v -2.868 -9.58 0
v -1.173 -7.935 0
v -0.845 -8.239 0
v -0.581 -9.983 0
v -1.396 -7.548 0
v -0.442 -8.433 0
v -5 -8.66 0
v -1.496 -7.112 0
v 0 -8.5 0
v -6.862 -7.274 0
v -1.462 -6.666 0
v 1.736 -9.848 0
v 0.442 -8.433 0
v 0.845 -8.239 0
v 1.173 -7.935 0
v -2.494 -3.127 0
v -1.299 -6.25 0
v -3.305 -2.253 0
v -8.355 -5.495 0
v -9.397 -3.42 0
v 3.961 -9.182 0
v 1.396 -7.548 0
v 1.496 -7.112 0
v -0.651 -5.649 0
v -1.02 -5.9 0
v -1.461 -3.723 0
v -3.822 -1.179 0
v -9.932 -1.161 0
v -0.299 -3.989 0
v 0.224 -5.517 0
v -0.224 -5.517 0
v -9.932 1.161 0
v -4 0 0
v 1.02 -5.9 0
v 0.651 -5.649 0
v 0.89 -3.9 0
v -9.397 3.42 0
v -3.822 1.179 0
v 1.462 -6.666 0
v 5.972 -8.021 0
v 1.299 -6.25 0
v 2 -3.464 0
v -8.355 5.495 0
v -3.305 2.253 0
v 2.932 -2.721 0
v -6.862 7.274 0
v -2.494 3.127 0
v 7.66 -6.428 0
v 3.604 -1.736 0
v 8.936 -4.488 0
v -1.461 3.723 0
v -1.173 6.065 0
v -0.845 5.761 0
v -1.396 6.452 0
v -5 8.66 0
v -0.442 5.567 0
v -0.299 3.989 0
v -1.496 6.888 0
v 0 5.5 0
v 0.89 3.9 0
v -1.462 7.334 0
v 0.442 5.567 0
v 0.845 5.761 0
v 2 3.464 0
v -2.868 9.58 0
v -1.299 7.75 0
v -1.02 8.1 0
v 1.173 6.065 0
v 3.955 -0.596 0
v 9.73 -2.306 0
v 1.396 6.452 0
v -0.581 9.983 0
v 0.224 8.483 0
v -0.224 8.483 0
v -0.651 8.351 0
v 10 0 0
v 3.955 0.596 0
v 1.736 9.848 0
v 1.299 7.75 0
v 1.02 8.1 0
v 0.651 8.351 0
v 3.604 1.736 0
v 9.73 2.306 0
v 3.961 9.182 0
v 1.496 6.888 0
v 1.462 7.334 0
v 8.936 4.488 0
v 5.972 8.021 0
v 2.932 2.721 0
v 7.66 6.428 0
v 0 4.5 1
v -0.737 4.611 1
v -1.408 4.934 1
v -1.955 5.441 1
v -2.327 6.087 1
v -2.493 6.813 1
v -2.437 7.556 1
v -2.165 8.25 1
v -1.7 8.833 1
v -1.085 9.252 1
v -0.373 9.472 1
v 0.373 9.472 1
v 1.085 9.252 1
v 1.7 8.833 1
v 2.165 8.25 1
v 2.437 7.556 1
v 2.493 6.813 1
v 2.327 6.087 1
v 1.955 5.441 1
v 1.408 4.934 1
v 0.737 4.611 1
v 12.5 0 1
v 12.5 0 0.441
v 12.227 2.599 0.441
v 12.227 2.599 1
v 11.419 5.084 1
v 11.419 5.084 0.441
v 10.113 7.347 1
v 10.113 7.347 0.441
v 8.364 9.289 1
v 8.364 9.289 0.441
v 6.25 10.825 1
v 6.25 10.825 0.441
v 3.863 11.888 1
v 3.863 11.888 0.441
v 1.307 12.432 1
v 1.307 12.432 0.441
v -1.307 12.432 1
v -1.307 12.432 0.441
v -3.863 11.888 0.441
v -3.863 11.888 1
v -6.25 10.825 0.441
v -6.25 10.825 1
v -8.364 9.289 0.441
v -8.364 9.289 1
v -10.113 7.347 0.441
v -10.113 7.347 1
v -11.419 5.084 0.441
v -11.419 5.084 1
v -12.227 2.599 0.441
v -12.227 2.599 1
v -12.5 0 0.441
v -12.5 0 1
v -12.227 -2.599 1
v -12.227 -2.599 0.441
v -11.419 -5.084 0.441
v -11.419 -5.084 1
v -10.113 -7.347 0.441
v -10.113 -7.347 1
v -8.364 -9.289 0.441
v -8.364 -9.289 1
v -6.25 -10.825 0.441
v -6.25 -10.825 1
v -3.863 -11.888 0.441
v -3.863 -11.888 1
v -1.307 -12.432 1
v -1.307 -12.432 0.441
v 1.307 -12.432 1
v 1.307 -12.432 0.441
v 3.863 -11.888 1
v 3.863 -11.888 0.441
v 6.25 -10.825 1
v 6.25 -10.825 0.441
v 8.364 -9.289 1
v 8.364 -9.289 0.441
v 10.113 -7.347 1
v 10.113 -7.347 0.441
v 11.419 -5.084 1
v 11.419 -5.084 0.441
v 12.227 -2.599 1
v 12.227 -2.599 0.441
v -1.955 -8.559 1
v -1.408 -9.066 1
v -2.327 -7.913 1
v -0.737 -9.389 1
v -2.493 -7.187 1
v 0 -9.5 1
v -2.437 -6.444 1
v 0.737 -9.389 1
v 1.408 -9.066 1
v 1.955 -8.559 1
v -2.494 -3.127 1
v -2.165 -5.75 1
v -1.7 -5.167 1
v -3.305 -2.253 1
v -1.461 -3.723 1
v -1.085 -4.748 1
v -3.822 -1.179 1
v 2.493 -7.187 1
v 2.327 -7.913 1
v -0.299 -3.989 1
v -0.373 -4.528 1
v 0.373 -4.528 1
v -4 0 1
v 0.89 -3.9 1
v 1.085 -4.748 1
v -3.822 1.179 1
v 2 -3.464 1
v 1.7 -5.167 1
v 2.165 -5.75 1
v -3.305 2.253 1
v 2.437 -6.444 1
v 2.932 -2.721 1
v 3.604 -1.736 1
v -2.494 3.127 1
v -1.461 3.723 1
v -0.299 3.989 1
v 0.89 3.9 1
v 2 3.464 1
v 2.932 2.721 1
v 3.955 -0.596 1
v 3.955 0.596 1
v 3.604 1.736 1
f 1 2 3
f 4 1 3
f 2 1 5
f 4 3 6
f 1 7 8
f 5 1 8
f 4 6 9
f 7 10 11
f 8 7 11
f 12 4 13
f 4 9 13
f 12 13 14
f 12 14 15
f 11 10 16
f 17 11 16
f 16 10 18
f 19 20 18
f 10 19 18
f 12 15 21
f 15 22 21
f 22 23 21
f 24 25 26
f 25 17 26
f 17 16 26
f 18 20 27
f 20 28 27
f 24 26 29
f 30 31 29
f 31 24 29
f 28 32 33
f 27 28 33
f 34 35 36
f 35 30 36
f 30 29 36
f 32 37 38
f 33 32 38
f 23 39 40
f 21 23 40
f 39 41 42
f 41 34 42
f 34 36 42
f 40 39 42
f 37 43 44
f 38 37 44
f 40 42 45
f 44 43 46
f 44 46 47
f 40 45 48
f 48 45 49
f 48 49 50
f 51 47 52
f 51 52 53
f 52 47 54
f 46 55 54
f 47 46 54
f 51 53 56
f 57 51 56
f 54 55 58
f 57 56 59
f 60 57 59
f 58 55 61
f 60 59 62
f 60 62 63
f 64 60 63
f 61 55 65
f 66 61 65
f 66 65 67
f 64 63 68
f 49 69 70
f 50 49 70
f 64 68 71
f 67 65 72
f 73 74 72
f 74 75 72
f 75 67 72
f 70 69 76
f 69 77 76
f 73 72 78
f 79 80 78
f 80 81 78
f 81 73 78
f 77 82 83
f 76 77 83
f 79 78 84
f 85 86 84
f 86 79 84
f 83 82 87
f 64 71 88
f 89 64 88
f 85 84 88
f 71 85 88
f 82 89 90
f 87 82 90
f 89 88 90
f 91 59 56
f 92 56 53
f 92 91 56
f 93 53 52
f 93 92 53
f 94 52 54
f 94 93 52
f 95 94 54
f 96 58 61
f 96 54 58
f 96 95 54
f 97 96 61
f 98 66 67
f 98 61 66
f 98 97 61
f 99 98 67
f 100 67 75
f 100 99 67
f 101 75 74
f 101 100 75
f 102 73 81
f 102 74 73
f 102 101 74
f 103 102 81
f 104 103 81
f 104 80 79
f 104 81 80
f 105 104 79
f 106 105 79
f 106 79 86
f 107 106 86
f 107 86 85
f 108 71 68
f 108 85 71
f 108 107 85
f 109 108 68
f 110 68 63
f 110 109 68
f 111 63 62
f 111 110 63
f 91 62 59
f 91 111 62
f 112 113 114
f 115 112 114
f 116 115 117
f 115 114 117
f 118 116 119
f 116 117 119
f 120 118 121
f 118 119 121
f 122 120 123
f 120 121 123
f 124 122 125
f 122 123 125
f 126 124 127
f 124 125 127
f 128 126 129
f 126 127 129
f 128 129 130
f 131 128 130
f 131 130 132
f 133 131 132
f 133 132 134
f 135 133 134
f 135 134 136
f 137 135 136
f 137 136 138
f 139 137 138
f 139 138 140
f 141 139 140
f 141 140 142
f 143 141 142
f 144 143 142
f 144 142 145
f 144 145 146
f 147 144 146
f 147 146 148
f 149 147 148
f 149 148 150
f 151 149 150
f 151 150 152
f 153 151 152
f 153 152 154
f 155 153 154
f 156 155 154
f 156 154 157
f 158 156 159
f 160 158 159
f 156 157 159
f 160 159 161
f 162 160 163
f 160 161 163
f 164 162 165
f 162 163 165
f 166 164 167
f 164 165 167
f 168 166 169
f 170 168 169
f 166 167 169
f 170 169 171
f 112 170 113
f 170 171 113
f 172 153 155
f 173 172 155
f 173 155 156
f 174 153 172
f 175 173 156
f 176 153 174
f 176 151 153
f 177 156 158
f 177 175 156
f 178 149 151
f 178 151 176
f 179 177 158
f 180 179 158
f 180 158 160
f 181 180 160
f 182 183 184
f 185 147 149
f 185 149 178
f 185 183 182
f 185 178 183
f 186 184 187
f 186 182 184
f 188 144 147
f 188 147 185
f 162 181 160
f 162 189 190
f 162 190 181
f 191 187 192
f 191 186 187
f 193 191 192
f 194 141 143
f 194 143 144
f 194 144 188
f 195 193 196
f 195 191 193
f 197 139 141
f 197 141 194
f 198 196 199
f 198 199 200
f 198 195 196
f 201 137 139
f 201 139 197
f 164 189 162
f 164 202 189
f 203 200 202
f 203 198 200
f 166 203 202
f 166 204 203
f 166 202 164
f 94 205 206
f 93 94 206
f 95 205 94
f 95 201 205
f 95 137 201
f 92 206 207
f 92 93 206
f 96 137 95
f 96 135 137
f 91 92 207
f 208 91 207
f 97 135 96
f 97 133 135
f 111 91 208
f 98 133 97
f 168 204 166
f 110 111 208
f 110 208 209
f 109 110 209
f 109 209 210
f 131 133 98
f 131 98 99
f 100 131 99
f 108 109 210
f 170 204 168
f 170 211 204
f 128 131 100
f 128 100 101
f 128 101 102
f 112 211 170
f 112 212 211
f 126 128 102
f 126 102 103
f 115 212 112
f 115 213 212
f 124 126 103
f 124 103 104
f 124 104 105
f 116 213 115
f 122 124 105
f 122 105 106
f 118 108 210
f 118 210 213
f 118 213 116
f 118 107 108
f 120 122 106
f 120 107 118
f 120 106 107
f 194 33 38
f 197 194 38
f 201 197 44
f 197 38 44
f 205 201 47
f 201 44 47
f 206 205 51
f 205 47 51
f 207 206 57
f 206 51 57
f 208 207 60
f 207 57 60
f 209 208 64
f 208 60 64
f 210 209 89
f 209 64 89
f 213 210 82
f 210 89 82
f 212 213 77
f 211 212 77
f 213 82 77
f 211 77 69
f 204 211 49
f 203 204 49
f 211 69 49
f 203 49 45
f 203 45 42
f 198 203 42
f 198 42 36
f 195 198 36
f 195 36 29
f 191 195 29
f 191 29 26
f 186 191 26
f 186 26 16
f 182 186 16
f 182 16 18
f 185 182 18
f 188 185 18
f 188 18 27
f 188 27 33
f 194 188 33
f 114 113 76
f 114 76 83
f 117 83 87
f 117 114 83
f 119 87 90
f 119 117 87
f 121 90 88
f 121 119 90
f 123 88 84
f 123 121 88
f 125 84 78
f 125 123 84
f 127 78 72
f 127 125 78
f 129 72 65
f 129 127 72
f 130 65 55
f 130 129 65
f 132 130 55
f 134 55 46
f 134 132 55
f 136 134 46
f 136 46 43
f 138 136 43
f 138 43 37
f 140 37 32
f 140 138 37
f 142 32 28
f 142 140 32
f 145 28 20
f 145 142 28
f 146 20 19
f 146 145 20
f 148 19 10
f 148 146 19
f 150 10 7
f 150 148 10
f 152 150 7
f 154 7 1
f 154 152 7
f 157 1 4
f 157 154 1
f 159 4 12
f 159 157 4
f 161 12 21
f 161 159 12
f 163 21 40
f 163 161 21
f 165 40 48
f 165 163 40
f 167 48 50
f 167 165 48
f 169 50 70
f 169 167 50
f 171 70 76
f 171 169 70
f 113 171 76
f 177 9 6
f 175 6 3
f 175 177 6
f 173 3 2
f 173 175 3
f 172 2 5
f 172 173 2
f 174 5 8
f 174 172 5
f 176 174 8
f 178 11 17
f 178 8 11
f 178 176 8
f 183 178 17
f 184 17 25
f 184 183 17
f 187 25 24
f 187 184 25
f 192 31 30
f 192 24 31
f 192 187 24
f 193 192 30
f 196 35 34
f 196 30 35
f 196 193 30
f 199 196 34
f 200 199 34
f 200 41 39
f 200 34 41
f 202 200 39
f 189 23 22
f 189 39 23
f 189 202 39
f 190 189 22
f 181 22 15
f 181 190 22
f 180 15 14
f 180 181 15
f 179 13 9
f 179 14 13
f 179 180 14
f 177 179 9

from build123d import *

# Parameters (mm, degrees)
SKETCH1_R                                    = 12.5
BOSS_EXTRUDE1_DEPTH                          = 1
CUT_EXTRUDE1_REACH                           = 19.706
SKETCH3_R                                    = 4
CSK_FOR_M3_FLAT_COUNTERSUNK_HEAD_SCR_2_COUNT = 2
CSK_FOR_M3_FLAT_COUNTERSUNK_HEAD_SCR_2_PITCH = 14


with BuildPart() as part:
    # Sketch1 → Boss-Extrude1 (new body)
    with BuildSketch(Plane.XY):
        Circle(SKETCH1_R)
    extrude(amount=BOSS_EXTRUDE1_DEPTH)

    # Sketch2 → Cut-Revolve1 (revolve, cut)
    with BuildSketch(Plane(origin=(0, 0, 2), x_dir=(0, 0, 1), z_dir=(-1, 0, 0)), mode=Mode.PRIVATE) as cut_revolve1_sk:
        Polygon((-2, 10), (-1.530086733, 12.665010569), (-2, 12.665010386), align=None)
    revolve(cut_revolve1_sk.sketch.rotate(Axis((0, 0, -0.1), (0, 0, 1)), 270), axis=Axis((0, 0, -0.1), (0, 0, 1)), mode=Mode.SUBTRACT)

    # Sketch3 → Cut-Extrude1 (cut, up to next)
    with BuildSketch(Plane(origin=(0, 0, 0), x_dir=(-1, 0, 0), z_dir=(0, 0, -1)), mode=Mode.PRIVATE) as cut_extrude1_sk1:
        Circle(SKETCH3_R)
    cut_extrude1_tool1 = extrude(cut_extrude1_sk1.sketch, amount=-CUT_EXTRUDE1_REACH, mode=Mode.PRIVATE) & part.part
    add(cut_extrude1_tool1.solids().sort_by_distance((0, 0, 0))[0], mode=Mode.SUBTRACT)

    # Sketch5 → CSK for M3 Flat Countersunk Head Screw1 (revolve, cut)
    with BuildSketch(Plane(origin=(0, 7, 1), x_dir=(0, -1, 0), z_dir=(1, 0, 0))):
        Polygon((0, 0), (0, 1), (1.35, 1), (1.35, 1.15), (2.5, 0), align=None)
    csk_for_m3_flat_countersunk_head_screw1 = revolve(axis=Axis((0, 7, 7.35), (0, 0, -1)), mode=Mode.SUBTRACT)

    # CSK for M3 Flat Countersunk Head Scr 2: CSK for M3 Flat Countersunk Head Screw1 ×2
    with Locations(*[(0, -i * CSK_FOR_M3_FLAT_COUNTERSUNK_HEAD_SCR_2_PITCH, 0) for i in range(1, CSK_FOR_M3_FLAT_COUNTERSUNK_HEAD_SCR_2_COUNT)]):
        add(csk_for_m3_flat_countersunk_head_screw1, mode=Mode.SUBTRACT)


solid = part.part
